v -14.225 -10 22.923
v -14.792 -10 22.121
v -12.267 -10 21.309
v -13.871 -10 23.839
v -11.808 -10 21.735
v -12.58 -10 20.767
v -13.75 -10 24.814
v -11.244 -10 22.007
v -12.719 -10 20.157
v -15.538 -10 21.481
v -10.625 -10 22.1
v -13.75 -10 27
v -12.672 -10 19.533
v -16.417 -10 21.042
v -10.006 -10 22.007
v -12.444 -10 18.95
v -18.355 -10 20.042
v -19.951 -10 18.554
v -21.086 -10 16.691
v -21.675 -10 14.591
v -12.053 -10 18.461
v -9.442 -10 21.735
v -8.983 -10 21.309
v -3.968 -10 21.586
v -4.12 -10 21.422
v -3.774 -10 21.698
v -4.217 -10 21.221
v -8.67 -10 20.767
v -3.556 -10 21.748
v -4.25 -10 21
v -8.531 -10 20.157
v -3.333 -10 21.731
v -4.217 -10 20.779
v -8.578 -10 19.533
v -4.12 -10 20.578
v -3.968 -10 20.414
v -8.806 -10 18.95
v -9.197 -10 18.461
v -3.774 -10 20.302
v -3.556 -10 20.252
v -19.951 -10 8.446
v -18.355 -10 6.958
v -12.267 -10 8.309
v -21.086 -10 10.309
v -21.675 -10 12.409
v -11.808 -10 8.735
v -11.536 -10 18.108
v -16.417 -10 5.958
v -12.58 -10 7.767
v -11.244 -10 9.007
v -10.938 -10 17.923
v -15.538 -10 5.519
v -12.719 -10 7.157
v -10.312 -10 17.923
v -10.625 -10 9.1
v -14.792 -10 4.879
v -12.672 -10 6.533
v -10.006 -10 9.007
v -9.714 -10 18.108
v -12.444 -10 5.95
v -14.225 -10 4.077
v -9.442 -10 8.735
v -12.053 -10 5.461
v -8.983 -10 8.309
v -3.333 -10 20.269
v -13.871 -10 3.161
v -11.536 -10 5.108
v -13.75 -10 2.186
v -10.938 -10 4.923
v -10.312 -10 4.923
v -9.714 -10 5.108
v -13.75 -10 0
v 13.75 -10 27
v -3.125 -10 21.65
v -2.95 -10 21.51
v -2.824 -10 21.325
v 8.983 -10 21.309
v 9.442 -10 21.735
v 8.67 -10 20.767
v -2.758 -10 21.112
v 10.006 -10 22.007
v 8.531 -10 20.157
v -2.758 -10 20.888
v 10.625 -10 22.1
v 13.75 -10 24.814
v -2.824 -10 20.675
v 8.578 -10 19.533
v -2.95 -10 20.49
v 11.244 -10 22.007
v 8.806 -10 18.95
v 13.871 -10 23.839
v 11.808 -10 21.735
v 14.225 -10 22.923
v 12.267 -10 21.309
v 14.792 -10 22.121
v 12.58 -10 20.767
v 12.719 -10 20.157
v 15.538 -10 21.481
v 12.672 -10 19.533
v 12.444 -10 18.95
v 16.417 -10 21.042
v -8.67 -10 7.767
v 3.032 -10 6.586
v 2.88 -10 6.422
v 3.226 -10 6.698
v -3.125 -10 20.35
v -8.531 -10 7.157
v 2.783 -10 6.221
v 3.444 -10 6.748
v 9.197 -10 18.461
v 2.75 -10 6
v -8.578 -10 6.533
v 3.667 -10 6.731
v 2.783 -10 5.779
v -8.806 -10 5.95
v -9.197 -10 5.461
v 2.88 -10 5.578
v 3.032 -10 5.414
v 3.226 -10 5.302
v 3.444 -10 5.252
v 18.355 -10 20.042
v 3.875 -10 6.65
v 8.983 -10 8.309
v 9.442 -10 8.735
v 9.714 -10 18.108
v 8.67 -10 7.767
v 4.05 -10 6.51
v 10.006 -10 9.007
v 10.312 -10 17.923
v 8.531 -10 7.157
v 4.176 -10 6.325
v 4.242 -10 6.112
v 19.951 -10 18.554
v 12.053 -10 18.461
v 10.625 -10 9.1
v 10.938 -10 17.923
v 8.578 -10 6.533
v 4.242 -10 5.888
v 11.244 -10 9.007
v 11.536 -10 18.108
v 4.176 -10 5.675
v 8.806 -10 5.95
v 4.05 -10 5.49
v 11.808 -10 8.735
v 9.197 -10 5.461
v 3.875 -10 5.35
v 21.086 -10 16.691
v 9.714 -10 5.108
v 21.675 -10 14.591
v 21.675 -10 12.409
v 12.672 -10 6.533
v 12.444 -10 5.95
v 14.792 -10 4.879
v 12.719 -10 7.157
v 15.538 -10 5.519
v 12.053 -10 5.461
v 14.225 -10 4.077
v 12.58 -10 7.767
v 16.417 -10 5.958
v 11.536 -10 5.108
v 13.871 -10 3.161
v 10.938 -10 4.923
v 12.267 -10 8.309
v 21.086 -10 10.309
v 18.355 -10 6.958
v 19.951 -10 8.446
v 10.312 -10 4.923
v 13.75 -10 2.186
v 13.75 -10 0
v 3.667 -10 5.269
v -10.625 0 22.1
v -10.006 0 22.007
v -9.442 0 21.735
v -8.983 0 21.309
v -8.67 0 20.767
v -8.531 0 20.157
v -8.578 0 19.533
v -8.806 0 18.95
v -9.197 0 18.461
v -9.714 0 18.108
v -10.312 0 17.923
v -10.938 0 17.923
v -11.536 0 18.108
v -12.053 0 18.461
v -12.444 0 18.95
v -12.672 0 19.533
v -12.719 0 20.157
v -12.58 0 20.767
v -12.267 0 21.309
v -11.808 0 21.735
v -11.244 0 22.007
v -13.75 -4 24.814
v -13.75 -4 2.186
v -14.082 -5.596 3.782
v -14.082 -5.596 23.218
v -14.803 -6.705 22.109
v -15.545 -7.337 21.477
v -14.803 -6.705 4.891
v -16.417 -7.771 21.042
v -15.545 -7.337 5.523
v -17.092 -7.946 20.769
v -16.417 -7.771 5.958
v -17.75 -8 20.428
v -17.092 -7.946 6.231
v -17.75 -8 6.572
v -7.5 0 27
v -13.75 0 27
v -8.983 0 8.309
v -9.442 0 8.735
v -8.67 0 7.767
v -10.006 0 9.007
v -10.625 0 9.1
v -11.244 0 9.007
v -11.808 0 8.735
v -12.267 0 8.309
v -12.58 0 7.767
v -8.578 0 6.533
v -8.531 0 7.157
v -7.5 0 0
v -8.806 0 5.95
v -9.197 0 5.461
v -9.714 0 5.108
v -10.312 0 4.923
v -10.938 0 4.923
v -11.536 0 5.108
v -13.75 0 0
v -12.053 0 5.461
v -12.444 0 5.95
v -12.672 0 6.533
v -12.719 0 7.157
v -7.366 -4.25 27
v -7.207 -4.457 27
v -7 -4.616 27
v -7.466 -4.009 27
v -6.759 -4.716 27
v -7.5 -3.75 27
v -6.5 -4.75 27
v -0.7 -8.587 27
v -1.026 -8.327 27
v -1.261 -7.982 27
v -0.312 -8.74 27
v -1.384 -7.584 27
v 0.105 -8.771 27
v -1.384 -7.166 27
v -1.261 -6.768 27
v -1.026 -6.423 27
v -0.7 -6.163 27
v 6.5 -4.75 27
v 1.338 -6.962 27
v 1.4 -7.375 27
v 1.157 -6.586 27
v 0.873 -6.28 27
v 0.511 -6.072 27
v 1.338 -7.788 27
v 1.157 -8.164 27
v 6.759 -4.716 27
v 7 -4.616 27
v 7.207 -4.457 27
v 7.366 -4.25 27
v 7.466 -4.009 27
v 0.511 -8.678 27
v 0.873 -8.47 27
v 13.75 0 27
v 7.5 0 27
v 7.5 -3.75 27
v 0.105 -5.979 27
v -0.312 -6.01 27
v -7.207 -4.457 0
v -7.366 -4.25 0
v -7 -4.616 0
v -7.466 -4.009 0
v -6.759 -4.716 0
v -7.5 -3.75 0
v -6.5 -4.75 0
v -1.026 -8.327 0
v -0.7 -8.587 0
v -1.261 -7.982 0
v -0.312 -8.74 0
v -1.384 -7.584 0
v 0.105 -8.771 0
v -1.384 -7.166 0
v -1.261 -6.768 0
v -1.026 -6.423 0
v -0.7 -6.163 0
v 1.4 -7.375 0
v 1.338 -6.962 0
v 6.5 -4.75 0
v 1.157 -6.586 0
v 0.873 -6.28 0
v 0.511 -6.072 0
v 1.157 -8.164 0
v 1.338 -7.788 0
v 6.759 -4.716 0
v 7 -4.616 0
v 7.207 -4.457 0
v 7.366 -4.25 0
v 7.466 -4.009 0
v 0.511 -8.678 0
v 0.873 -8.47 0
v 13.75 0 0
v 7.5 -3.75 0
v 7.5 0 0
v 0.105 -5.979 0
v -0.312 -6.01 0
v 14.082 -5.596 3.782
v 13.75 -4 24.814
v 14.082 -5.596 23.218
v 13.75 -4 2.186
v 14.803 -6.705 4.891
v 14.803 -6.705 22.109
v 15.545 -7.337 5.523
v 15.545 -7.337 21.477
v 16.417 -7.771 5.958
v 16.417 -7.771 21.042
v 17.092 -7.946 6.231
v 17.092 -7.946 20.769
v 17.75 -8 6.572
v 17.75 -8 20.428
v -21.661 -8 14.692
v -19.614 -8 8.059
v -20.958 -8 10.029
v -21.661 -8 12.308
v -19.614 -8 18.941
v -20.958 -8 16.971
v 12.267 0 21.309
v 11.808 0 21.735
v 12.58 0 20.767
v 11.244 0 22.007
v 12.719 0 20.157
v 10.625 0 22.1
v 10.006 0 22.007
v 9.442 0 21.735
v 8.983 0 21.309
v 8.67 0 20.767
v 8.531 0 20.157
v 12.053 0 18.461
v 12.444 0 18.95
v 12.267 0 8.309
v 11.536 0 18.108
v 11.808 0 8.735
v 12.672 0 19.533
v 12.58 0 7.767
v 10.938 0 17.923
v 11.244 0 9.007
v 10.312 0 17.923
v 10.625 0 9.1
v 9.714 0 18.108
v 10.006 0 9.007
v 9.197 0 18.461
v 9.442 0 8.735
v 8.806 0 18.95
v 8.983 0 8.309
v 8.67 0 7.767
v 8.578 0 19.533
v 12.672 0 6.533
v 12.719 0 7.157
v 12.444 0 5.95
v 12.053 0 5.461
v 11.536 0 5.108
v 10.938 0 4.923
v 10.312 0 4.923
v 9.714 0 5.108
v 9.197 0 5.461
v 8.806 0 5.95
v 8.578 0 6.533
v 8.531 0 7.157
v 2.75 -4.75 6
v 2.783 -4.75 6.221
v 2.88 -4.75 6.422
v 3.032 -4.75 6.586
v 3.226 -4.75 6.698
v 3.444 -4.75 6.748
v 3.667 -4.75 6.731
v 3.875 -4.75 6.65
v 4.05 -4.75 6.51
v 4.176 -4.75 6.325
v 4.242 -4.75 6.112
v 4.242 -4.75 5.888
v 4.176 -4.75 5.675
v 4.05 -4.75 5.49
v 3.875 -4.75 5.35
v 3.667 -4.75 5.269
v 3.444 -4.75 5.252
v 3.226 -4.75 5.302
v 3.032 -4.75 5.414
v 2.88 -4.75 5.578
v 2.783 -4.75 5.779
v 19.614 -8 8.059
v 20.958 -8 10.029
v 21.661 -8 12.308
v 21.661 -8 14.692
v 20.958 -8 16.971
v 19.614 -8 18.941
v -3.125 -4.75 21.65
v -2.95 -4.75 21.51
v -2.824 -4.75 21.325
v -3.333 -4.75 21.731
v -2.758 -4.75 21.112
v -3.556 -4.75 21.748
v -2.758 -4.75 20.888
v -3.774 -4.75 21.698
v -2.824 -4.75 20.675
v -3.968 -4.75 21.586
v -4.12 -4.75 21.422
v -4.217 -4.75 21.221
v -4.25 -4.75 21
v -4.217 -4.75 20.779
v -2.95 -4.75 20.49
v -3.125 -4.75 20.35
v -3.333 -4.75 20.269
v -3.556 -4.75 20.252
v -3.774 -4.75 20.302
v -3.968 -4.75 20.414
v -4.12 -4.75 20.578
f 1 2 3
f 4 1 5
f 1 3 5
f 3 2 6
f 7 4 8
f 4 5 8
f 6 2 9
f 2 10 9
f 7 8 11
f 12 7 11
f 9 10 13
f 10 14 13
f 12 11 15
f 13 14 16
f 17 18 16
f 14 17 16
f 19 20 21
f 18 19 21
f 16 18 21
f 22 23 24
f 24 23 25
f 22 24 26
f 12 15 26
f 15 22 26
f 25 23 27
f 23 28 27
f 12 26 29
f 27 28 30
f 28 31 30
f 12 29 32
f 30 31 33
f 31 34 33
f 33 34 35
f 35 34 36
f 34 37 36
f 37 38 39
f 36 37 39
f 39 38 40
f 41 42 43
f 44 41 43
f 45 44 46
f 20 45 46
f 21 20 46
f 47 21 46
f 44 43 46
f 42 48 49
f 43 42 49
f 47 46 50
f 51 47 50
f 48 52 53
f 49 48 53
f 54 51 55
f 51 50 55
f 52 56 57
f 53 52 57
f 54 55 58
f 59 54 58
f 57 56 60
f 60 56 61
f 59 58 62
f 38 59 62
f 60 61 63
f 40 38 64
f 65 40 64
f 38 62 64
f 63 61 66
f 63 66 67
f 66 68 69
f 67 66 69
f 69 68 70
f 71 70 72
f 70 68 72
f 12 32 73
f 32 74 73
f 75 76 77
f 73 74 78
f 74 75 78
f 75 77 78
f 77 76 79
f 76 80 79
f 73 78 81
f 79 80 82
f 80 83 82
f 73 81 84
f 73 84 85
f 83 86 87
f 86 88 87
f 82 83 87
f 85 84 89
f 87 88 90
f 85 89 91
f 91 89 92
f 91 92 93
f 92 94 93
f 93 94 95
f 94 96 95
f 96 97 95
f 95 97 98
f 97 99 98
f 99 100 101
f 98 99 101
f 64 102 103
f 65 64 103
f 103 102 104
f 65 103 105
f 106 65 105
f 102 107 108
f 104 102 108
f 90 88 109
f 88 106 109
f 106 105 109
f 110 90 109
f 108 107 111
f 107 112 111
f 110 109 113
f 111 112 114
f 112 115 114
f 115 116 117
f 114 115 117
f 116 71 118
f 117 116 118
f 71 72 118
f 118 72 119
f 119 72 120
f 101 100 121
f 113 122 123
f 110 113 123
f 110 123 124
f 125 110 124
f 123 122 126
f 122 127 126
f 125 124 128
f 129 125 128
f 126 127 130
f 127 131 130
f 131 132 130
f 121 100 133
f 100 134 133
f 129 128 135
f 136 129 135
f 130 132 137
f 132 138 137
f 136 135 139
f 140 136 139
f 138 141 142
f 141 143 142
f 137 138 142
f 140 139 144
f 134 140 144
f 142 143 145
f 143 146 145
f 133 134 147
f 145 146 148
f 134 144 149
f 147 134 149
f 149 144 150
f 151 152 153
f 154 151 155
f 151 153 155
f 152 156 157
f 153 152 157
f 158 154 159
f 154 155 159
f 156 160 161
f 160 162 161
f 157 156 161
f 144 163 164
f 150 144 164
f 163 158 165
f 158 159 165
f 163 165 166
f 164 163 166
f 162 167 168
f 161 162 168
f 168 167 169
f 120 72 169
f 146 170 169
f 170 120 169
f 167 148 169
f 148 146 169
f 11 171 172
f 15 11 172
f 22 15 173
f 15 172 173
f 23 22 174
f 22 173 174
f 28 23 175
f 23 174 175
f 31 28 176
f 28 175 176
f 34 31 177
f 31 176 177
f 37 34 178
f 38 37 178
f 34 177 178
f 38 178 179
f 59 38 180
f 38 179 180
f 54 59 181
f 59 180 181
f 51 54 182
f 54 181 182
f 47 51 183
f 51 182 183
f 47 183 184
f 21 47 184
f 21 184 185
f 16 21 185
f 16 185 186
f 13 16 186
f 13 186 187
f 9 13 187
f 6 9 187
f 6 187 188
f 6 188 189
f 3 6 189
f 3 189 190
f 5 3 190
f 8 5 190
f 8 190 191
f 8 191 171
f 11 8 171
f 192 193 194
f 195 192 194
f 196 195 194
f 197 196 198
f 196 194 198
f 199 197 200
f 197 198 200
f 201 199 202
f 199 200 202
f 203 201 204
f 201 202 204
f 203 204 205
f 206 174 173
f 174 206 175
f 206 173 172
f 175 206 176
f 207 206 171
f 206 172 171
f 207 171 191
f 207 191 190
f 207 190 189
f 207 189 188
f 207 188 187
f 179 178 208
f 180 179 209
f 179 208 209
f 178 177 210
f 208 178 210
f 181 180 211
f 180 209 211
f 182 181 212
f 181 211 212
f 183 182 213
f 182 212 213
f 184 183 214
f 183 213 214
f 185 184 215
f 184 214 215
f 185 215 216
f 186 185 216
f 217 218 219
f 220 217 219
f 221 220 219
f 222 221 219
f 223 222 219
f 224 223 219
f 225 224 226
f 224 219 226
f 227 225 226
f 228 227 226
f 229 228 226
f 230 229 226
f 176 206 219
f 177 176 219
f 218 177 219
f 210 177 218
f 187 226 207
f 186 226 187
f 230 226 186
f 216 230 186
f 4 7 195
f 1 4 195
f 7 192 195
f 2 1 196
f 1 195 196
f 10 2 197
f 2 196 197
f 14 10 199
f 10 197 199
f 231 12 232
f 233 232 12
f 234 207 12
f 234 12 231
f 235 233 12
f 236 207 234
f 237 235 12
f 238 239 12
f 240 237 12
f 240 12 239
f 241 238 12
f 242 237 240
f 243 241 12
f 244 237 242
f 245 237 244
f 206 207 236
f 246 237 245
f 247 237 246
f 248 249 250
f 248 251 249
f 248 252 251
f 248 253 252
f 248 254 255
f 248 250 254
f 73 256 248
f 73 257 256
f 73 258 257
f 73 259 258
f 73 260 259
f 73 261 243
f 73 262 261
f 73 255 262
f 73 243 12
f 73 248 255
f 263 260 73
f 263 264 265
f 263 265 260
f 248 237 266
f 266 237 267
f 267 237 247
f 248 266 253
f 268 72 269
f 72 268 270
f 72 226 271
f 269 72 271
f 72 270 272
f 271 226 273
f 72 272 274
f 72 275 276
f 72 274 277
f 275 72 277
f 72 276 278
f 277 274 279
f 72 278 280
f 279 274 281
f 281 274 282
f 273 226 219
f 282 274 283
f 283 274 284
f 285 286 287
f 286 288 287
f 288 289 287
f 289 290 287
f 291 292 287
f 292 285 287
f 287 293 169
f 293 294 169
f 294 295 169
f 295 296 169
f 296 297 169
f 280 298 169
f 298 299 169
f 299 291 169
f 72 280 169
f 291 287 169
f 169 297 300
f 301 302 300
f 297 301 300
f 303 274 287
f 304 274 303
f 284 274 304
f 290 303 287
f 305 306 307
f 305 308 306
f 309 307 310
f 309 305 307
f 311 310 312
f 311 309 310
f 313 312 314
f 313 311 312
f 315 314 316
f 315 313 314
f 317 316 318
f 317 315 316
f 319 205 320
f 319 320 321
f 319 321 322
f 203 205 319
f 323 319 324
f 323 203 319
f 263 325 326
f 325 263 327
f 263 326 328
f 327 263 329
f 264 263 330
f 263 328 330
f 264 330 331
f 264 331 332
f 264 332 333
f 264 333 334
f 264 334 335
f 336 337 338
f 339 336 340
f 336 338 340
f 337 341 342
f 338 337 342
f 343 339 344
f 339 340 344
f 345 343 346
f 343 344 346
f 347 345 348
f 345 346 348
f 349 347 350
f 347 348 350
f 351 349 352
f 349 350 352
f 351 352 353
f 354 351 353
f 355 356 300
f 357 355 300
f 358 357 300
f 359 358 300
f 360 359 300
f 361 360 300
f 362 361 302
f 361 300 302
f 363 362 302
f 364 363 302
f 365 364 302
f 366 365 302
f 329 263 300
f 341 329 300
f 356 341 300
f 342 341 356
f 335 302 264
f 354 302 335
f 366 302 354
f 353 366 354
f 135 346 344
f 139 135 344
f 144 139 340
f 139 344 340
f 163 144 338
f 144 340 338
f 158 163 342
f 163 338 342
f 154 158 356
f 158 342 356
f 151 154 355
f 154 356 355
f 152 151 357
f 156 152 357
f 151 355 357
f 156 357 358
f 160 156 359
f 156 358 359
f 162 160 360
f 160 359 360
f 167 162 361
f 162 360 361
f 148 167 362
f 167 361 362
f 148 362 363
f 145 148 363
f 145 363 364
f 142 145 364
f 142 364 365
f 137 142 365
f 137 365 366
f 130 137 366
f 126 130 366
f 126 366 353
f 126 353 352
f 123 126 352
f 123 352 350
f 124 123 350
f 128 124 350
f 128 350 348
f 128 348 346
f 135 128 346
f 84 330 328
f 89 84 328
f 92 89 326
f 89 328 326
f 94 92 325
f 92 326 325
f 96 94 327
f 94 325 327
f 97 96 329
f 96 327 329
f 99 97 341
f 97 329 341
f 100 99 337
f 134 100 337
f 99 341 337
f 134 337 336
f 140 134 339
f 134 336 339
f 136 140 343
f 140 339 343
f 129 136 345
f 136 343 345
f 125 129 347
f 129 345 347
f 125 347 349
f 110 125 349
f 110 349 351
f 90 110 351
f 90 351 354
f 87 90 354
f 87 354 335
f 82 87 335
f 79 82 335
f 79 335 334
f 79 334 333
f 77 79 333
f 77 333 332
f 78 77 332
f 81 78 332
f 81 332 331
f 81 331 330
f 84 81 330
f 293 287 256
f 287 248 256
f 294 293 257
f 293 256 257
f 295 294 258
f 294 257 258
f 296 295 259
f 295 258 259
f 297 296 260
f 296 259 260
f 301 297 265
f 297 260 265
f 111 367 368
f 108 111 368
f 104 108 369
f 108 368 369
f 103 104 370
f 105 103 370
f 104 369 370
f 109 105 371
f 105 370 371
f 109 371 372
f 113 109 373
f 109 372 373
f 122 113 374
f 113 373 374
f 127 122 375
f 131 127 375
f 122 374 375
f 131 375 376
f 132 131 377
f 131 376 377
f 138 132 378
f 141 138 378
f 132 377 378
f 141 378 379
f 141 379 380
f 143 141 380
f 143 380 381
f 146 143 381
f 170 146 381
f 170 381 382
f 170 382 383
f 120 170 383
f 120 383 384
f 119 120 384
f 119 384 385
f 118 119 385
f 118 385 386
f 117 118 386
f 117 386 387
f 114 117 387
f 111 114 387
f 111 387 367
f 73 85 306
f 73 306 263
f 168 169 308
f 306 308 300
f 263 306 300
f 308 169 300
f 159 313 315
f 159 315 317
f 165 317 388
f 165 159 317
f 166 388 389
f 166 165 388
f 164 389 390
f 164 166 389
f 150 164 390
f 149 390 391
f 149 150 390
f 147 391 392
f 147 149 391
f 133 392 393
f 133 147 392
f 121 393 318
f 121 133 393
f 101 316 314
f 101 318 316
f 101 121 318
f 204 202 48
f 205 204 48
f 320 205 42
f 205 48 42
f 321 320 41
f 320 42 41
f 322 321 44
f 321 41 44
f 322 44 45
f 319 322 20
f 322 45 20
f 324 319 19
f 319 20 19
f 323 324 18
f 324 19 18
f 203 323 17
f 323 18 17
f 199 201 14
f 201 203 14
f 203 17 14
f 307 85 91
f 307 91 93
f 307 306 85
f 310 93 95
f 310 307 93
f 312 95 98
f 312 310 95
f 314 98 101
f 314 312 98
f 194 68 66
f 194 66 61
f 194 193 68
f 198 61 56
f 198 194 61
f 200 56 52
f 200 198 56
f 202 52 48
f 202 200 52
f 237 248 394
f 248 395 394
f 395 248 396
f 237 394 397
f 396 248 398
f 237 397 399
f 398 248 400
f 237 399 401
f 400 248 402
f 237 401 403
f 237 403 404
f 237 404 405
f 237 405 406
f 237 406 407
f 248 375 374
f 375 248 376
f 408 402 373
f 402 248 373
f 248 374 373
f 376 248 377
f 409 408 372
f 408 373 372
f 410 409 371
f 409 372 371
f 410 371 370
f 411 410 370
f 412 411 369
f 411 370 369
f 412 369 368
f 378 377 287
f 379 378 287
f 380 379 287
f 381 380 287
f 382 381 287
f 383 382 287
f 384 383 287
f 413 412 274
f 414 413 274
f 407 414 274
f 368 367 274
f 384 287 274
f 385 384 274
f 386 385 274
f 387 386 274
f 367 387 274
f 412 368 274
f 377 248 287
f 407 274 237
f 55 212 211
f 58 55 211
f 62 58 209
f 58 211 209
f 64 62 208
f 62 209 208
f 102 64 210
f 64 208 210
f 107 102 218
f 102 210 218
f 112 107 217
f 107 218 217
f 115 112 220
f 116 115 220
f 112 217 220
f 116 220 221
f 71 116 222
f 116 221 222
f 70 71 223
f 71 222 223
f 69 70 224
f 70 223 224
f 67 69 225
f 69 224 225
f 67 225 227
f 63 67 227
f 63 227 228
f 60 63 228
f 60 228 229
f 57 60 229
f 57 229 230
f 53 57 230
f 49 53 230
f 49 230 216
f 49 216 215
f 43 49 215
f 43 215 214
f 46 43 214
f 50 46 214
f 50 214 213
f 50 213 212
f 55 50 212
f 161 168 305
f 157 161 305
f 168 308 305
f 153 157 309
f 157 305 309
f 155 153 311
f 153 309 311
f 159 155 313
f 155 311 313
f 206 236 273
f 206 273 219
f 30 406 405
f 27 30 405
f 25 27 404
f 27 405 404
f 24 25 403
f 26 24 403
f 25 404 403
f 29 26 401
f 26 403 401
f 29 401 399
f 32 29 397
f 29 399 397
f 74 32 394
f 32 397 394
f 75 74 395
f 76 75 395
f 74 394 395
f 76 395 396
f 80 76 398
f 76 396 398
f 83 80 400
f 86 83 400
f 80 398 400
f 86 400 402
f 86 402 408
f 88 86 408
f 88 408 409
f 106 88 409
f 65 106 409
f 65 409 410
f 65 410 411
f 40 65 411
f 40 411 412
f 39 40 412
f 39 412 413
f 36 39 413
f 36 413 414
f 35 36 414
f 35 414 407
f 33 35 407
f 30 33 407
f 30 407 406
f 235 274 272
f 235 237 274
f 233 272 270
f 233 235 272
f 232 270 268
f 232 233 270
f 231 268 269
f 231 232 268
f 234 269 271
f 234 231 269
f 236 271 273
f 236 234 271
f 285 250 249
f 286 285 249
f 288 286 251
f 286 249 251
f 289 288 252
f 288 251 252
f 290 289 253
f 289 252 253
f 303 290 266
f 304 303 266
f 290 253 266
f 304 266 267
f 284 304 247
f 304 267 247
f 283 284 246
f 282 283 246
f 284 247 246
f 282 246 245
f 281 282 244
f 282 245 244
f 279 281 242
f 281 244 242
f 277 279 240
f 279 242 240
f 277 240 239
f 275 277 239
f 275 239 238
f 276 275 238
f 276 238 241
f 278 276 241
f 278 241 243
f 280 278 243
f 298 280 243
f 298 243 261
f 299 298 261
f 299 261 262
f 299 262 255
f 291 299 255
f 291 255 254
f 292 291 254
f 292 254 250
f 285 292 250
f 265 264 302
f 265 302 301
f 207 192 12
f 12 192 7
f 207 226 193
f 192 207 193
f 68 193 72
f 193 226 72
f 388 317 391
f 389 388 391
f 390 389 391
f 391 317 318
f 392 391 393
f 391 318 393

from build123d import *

# Parameters (mm, degrees)
BOSS_EXTRUDE1_DEPTH = 27
BOSS_EXTRUDE2_DEPTH = 2
SKETCH3_R           = 2.1
CUT_EXTRUDE1_DEPTH  = 37.084103148
SKETCH4_R           = 1.4
CUT_EXTRUDE2_DEPTH  = 37.084103148
FILLET1_R           = 1
FILLET2_R           = 4
SKETCH5_R           = 0.75
CUT_EXTRUDE3_DEPTH  = 36.06600926


with BuildPart() as part:
    # Sketch1 → Boss-Extrude1 (new body)
    with BuildSketch(Plane.XY):
        Polygon((7.5, -4.75), (-7.5, -4.75), (-7.5, 0), (-13.75, 0), (-13.75, -10), (13.75, -10), (13.75, 0), (7.5, 0), align=None)
    extrude(amount=BOSS_EXTRUDE1_DEPTH)

    # Sketch2 → Boss-Extrude2 (add)
    with BuildSketch(Plane.XZ.offset(10)):
        with BuildLine():
            Line((13.75, 21.5), (13.75, 5.5))
            ThreePointArc((13.75, 5.5), (21.75, 13.5), (13.75, 21.5))
        make_face()
        with BuildLine():
            Line((-13.75, 21.5), (-13.75, 5.5))
            ThreePointArc((-13.75, 5.5), (-21.75, 13.5), (-13.75, 21.5))
        make_face()
    extrude(amount=-BOSS_EXTRUDE2_DEPTH)

    # Sketch3 → Cut-Extrude1 (cut, through all)
    with BuildSketch(Plane(origin=(0, 0, 0), x_dir=(1, 0, 0), z_dir=(0, 1, 0))):
        with Locations((-10.625, -20)):
            Circle(SKETCH3_R)
        with Locations((10.625, -20)):
            Circle(SKETCH3_R)
        with Locations((10.625, -7)):
            Circle(SKETCH3_R)
        with Locations((-10.625, -7)):
            Circle(SKETCH3_R)
    extrude(amount=-CUT_EXTRUDE1_DEPTH, mode=Mode.SUBTRACT)

    # Sketch4 → Cut-Extrude2 (cut, through all)
    with BuildSketch(Plane.XY.offset(27)):
        with Locations((0, -7.375)):
            Circle(SKETCH4_R)
    extrude(amount=-CUT_EXTRUDE2_DEPTH, mode=Mode.SUBTRACT)

    # Fillet1
    fillet1_edges = [part.edges().sort_by_distance(p)[0] for p in [
        (7.5, -4.75, 13.5),
        (-7.5, -4.75, 13.5),
    ]]
    fillet(fillet1_edges, radius=FILLET1_R)

    # Fillet2
    fillet2_edges = [part.edges().sort_by_distance(p)[0] for p in [
        (13.75, -9, 5.5),
        (13.75, -8, 13.5),
        (13.75, -9, 21.5),
        (-13.75, -9, 5.5),
        (-13.75, -8, 13.5),
        (-13.75, -9, 21.5),
    ]]
    fillet(fillet2_edges, radius=FILLET2_R)

    # Sketch5 → Cut-Extrude3 (cut, through all)
    with BuildSketch(Plane(origin=(0, -4.75, 0), x_dir=(1, 0, 0), z_dir=(0, 1, 0))):
        with Locations((3.5, -6)):
            Circle(SKETCH5_R)
        with Locations((-3.5, -21)):
            Circle(SKETCH5_R)
    extrude(amount=-CUT_EXTRUDE3_DEPTH, mode=Mode.SUBTRACT)


solid = part.part
